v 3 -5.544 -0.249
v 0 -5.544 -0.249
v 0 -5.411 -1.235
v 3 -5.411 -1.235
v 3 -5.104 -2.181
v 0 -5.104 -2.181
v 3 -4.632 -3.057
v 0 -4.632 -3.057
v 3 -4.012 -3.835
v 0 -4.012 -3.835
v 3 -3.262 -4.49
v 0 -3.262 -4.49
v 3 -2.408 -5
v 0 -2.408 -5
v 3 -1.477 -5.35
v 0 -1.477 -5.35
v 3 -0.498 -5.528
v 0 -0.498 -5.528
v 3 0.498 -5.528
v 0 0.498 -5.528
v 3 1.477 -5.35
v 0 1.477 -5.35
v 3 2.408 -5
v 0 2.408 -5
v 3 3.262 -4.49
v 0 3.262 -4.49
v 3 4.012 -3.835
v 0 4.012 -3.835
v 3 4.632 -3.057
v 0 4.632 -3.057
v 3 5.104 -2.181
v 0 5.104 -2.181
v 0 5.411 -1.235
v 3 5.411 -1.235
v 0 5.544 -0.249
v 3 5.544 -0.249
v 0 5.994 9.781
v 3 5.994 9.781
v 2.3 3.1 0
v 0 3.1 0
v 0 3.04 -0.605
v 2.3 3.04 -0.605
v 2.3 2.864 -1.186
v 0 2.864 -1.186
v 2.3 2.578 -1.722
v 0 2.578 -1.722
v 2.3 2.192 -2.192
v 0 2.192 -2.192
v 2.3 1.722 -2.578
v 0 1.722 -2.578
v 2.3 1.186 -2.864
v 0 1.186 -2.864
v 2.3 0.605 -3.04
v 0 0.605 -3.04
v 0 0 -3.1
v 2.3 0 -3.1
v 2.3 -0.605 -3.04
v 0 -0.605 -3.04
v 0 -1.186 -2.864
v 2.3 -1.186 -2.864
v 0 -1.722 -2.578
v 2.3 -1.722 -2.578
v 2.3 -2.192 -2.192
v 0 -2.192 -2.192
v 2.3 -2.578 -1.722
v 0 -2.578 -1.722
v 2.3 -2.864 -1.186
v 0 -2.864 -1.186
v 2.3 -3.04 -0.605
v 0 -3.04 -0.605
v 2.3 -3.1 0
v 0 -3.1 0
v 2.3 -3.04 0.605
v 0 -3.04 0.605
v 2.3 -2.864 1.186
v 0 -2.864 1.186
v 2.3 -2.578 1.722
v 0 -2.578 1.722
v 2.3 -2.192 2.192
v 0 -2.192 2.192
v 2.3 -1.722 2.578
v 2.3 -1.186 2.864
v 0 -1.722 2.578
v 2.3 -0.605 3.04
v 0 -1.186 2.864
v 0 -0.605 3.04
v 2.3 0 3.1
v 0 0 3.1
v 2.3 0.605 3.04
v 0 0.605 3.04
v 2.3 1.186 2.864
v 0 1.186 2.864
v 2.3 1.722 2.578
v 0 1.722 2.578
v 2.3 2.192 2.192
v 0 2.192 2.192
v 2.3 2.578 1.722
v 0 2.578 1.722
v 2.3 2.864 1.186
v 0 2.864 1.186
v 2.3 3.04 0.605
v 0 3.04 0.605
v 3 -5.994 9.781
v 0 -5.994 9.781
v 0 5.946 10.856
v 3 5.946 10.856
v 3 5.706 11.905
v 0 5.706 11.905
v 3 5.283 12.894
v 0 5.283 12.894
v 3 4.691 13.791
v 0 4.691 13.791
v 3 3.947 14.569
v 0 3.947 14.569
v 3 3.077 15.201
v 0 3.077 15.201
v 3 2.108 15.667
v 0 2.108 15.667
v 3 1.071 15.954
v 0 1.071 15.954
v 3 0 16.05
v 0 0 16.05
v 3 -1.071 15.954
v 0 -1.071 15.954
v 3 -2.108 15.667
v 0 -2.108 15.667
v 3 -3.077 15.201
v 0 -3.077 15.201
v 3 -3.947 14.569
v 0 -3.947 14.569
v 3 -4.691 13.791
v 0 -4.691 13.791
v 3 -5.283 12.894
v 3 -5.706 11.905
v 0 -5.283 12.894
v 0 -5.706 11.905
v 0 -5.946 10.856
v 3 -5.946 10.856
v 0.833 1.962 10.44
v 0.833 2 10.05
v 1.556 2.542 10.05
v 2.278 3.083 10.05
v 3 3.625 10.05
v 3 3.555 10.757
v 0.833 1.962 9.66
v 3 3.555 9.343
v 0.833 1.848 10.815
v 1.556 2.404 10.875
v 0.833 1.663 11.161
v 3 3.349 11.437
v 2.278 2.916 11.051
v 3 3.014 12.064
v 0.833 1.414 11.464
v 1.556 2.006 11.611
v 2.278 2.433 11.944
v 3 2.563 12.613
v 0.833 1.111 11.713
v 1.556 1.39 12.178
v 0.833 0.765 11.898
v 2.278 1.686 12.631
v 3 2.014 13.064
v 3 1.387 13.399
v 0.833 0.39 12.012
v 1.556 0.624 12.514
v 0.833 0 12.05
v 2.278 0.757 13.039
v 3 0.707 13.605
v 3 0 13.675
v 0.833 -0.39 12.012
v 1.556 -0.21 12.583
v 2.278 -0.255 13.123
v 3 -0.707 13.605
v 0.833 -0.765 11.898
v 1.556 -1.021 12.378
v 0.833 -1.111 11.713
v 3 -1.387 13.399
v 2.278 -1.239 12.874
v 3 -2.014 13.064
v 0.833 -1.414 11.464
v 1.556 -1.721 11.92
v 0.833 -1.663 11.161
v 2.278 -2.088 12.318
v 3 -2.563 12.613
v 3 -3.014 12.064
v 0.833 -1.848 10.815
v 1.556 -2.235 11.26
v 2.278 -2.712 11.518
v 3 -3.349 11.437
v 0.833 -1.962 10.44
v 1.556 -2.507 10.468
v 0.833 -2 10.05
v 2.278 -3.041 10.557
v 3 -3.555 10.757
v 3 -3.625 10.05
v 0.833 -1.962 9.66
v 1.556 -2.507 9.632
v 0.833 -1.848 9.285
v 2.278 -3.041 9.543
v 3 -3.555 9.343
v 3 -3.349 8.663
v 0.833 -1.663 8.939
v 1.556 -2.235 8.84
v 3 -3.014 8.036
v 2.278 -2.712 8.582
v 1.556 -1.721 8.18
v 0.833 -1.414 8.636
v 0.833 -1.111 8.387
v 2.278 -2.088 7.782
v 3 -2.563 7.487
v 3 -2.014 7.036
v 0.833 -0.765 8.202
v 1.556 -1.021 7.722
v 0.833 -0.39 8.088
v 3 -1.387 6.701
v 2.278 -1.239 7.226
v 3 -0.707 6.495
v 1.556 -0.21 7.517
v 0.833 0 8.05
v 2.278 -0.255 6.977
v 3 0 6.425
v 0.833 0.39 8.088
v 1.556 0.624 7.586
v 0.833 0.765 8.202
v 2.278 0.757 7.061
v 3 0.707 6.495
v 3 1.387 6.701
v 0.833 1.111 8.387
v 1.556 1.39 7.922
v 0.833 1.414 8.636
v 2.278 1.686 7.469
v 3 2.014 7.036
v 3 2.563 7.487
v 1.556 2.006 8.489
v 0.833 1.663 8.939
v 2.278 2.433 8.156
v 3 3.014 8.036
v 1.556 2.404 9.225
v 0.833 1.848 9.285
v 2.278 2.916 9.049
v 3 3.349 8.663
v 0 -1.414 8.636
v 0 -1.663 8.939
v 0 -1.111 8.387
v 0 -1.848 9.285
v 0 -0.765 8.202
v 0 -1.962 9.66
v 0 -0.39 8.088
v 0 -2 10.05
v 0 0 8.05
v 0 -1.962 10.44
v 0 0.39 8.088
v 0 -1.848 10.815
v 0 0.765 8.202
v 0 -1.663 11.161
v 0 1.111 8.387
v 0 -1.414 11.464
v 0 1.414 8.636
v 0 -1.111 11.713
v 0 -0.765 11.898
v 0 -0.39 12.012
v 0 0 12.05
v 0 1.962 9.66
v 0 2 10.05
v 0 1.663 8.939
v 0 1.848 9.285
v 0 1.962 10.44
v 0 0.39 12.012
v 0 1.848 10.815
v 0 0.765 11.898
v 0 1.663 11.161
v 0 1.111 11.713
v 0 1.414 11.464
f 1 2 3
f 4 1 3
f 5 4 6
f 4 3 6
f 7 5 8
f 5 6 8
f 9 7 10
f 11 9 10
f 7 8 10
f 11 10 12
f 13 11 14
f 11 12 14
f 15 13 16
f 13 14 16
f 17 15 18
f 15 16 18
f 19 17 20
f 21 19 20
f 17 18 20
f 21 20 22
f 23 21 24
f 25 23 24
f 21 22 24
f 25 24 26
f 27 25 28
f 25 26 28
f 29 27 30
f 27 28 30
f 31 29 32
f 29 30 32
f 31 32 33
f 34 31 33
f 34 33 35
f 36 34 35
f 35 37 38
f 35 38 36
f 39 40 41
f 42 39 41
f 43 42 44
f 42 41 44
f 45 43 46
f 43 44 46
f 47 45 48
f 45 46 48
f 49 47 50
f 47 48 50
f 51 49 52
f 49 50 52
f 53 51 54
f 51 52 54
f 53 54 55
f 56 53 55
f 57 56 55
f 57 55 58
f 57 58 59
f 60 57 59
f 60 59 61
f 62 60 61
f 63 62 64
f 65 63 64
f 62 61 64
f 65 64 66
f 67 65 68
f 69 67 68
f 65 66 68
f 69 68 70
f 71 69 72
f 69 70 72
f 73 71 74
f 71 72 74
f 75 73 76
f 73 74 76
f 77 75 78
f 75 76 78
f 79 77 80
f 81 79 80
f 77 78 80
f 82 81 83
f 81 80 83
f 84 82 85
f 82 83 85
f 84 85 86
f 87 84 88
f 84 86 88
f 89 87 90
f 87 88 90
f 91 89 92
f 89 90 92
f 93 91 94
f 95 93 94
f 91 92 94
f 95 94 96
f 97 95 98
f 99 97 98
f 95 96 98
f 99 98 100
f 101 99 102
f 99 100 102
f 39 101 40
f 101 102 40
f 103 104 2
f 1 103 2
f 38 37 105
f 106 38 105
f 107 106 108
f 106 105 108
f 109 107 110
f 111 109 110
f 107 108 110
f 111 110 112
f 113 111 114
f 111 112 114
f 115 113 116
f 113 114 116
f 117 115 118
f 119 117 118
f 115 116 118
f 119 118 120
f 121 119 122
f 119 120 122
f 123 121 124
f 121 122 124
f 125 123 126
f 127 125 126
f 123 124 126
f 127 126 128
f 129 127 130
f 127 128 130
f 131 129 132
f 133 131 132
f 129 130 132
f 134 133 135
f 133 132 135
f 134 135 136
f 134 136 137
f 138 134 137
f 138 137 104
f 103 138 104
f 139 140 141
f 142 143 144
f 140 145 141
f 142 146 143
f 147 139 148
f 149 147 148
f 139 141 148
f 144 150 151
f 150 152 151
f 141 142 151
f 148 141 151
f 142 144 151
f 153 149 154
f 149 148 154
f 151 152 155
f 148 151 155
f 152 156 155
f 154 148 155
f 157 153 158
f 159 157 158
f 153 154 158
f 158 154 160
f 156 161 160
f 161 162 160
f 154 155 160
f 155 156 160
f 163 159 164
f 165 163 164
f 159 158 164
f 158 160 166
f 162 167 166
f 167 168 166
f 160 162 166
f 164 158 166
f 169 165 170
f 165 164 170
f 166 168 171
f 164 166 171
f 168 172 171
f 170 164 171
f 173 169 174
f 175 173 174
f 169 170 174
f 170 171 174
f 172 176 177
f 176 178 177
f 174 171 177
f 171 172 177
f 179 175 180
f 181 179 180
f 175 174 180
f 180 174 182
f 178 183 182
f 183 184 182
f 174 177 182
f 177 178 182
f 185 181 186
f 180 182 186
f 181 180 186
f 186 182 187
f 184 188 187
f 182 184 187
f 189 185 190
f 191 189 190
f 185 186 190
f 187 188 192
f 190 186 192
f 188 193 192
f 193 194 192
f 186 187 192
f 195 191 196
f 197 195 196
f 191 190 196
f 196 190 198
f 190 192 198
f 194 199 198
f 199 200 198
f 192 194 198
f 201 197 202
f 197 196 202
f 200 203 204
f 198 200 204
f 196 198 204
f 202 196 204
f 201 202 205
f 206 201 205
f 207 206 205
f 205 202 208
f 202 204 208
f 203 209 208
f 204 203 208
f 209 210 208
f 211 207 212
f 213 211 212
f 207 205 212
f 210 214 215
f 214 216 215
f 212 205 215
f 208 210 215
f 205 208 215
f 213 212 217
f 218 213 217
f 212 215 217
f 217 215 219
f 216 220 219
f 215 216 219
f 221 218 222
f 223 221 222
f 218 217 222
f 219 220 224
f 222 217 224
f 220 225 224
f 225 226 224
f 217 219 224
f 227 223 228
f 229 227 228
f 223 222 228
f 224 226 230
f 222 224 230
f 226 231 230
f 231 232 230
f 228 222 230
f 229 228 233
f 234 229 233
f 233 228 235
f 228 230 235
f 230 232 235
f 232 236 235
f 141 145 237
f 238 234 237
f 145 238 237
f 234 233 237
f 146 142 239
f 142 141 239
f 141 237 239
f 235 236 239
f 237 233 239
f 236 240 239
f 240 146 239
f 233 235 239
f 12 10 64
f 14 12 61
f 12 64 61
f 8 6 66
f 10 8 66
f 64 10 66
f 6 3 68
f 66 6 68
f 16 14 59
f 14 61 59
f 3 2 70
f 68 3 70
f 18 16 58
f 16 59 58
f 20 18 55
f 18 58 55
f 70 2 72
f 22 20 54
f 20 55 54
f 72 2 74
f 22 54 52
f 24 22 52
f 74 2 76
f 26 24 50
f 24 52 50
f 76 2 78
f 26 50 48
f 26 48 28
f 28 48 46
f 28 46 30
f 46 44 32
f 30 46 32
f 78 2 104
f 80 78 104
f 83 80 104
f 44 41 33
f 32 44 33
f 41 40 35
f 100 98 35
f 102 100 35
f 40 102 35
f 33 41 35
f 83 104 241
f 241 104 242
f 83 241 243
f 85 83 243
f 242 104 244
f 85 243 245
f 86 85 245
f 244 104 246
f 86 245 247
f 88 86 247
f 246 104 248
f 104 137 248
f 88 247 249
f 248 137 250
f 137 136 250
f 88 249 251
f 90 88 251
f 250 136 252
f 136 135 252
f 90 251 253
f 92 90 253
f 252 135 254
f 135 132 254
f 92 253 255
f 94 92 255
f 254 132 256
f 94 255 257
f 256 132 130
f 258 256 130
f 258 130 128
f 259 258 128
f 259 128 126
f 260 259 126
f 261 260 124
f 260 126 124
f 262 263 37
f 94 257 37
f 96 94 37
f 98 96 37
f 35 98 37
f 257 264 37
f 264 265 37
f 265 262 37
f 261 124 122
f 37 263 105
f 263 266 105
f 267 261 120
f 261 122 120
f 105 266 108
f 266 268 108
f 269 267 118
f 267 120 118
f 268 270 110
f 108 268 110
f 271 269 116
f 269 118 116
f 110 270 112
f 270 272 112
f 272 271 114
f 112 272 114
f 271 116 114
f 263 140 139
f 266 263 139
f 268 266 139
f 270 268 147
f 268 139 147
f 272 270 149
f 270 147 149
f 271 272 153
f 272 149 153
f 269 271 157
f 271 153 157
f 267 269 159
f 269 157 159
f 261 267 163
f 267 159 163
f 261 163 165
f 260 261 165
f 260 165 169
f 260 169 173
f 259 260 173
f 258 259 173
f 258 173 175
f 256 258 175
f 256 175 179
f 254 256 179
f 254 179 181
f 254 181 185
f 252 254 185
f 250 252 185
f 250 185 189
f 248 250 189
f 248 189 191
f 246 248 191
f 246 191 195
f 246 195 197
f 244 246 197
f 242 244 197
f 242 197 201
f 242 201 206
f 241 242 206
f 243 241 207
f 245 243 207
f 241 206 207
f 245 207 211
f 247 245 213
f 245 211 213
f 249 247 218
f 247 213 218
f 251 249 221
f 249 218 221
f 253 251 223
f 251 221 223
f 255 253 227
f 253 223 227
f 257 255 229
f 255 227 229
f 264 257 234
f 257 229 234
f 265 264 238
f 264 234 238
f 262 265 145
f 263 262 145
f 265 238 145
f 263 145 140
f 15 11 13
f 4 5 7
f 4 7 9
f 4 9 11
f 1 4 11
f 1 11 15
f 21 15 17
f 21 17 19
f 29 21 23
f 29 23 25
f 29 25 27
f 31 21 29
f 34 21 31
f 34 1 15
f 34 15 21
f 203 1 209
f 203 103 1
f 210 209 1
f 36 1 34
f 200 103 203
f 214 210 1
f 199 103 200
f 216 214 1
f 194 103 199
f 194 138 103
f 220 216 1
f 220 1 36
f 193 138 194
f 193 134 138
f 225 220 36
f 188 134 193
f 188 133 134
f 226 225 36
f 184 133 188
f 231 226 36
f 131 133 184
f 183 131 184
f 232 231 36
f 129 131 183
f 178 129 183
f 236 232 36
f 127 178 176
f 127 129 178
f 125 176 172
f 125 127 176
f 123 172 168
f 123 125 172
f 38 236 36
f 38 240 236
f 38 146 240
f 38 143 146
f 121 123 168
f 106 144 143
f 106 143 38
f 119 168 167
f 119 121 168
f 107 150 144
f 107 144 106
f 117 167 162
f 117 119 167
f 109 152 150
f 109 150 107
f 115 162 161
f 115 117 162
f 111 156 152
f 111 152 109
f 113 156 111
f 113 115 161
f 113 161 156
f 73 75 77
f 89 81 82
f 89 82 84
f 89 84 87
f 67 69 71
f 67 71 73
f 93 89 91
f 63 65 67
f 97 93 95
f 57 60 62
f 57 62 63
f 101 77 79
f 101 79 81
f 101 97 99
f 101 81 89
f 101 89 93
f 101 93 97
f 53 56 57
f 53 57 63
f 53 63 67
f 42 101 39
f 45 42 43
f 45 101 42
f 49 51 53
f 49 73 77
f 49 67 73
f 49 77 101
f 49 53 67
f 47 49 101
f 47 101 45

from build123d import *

# Parameters (mm, degrees)
SKETCH003_R     = 1.75
SKETCH004_R     = 4
PAD_DEPTH       = 3
SKETCH001_R     = 3.1
POCKET_DEPTH    = 2.3
SKETCH002_R     = 2
POCKET001_DEPTH = 3.001


with BuildPart() as schraubenkopf:
    # Sketch003 → Loft section 0
    with BuildSketch(Plane.YZ.offset(0.5)):
        with Locations((0, 10.05)):
            Circle(SKETCH003_R)
    # Sketch004 → Loft section 1
    with BuildSketch(Plane.YZ.offset(3.5)):
        with Locations((0, 10.05)):
            Circle(SKETCH004_R)
    loft()


with BuildPart() as cut:
    # Sketch → Pad (new body)
    with BuildSketch(Plane.YZ):
        with BuildLine():
            Line((-5.993983, 9.781369), (-5.544434, -0.248507))
            ThreePointArc((-5.544434, -0.248507), (0, -5.55), (5.544434, -0.248507))
            Line((5.993983, 9.781369), (5.544434, -0.248507))
            ThreePointArc((5.993983, 9.781369), (0, 16.05), (-5.993983, 9.781369))
        make_face()
    extrude(amount=PAD_DEPTH)

    # Sketch001 → Pocket (cut)
    with BuildSketch(Plane(origin=(0, 0, 0), x_dir=(0, 1, 0), z_dir=(-1, 0, 0))):
        Circle(SKETCH001_R)
    extrude(amount=-POCKET_DEPTH, mode=Mode.SUBTRACT)

    # Sketch002 → Pocket001 (cut, through all)
    with BuildSketch(Plane.YZ.offset(3)):
        with Locations((0, 10.05)):
            Circle(SKETCH002_R)
    extrude(amount=-POCKET001_DEPTH, mode=Mode.SUBTRACT)

    # Cut: cut Schraubenkopf
    add(schraubenkopf.part, mode=Mode.SUBTRACT)


solid = cut.part
